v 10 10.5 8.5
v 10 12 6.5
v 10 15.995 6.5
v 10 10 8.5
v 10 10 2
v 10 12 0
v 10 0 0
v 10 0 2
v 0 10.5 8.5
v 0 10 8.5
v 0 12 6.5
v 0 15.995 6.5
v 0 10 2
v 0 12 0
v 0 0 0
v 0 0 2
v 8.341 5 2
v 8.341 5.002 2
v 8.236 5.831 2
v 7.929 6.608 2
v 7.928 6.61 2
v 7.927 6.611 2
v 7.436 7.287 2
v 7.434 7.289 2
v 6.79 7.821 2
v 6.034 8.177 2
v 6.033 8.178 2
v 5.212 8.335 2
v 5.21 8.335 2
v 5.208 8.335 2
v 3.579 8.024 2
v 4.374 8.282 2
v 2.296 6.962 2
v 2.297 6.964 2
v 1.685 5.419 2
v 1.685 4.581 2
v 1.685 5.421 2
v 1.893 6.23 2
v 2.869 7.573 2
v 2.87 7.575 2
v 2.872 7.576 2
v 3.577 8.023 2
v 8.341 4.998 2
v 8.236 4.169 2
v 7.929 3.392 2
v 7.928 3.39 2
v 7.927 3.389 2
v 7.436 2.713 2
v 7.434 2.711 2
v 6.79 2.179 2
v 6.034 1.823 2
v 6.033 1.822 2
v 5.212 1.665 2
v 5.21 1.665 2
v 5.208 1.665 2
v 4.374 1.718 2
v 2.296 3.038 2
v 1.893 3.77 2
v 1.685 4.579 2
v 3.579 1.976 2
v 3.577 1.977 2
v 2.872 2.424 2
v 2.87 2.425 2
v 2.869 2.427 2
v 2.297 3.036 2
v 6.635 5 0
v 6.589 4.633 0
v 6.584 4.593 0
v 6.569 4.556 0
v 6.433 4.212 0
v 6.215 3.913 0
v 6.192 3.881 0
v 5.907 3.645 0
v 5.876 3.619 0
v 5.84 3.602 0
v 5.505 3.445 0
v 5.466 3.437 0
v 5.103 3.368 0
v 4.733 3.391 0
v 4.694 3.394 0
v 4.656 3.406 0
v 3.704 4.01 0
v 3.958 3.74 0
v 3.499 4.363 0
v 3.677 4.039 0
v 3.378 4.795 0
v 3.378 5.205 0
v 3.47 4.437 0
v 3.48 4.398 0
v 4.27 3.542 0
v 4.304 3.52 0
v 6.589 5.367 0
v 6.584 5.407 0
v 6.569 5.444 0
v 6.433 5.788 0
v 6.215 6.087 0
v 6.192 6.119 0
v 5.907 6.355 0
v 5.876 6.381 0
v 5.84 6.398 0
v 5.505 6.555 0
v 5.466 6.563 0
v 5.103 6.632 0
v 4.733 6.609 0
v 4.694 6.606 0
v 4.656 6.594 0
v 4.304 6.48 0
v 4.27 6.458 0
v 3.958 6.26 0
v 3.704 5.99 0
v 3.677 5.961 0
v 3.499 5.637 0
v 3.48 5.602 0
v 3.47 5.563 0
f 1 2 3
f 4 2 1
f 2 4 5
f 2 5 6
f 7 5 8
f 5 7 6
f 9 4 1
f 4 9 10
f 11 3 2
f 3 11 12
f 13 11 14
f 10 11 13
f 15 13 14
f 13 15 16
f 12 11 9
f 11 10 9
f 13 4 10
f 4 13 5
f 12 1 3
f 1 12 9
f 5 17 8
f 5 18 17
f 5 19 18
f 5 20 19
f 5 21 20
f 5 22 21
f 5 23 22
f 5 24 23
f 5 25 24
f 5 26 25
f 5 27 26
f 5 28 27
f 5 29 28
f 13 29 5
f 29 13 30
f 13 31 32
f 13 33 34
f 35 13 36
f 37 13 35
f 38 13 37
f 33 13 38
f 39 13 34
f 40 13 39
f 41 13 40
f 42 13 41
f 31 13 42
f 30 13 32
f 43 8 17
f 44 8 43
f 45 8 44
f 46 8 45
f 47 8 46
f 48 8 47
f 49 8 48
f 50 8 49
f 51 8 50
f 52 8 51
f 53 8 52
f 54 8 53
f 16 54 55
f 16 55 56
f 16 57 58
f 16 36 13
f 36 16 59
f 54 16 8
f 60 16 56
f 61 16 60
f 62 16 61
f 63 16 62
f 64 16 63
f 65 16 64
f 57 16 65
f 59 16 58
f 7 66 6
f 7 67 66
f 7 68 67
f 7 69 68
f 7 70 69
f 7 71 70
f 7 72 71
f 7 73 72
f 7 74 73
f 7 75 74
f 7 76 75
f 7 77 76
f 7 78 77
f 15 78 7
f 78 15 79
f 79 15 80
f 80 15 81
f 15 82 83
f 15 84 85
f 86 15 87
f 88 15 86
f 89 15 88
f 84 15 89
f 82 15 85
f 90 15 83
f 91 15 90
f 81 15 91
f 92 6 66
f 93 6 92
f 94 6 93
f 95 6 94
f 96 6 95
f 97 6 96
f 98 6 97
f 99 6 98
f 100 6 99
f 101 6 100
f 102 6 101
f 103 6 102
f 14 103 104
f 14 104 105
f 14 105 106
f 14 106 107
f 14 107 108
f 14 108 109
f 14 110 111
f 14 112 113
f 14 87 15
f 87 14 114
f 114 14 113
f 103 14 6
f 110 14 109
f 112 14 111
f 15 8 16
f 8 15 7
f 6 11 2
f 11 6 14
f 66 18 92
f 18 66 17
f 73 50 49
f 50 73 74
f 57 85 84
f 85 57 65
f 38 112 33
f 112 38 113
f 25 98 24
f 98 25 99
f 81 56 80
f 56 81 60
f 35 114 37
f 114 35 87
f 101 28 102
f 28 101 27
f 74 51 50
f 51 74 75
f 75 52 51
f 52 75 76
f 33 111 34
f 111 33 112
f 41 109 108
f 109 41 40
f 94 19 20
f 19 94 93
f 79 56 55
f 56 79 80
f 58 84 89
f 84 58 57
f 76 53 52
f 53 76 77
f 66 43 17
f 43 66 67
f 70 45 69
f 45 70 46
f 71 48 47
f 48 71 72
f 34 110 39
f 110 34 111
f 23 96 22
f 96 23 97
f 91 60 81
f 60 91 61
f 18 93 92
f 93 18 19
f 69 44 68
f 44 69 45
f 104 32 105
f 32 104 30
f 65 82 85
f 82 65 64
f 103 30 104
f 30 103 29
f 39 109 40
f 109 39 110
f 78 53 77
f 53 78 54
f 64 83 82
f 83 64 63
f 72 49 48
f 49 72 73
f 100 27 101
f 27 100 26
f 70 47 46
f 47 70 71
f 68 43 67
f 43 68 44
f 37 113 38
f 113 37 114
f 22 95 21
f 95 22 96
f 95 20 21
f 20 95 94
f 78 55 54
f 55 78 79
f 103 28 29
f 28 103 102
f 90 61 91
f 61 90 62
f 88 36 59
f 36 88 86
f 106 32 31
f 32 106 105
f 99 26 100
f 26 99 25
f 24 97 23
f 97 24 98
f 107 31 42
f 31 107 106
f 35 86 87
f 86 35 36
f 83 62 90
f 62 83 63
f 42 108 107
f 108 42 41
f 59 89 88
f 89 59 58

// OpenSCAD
alt = 6.5;
larg=10;
comp=10;




difference() {
   union(){
      cube([larg,comp,2]);
      translate([0,comp,0]) cube([larg,2,alt]);
      difference() {
           translate([0,comp,alt]) cube([larg,6,2]);
           translate([-1,comp+0.5,alt+2]) rotate([-20,0,0]) cube([larg+2,6,2]);

      }
   }
  translate([larg/2,comp/2,-0.1]) cylinder(h=2.11, r1=1.55, r2=3.35, center=false,$fn=25);
}
